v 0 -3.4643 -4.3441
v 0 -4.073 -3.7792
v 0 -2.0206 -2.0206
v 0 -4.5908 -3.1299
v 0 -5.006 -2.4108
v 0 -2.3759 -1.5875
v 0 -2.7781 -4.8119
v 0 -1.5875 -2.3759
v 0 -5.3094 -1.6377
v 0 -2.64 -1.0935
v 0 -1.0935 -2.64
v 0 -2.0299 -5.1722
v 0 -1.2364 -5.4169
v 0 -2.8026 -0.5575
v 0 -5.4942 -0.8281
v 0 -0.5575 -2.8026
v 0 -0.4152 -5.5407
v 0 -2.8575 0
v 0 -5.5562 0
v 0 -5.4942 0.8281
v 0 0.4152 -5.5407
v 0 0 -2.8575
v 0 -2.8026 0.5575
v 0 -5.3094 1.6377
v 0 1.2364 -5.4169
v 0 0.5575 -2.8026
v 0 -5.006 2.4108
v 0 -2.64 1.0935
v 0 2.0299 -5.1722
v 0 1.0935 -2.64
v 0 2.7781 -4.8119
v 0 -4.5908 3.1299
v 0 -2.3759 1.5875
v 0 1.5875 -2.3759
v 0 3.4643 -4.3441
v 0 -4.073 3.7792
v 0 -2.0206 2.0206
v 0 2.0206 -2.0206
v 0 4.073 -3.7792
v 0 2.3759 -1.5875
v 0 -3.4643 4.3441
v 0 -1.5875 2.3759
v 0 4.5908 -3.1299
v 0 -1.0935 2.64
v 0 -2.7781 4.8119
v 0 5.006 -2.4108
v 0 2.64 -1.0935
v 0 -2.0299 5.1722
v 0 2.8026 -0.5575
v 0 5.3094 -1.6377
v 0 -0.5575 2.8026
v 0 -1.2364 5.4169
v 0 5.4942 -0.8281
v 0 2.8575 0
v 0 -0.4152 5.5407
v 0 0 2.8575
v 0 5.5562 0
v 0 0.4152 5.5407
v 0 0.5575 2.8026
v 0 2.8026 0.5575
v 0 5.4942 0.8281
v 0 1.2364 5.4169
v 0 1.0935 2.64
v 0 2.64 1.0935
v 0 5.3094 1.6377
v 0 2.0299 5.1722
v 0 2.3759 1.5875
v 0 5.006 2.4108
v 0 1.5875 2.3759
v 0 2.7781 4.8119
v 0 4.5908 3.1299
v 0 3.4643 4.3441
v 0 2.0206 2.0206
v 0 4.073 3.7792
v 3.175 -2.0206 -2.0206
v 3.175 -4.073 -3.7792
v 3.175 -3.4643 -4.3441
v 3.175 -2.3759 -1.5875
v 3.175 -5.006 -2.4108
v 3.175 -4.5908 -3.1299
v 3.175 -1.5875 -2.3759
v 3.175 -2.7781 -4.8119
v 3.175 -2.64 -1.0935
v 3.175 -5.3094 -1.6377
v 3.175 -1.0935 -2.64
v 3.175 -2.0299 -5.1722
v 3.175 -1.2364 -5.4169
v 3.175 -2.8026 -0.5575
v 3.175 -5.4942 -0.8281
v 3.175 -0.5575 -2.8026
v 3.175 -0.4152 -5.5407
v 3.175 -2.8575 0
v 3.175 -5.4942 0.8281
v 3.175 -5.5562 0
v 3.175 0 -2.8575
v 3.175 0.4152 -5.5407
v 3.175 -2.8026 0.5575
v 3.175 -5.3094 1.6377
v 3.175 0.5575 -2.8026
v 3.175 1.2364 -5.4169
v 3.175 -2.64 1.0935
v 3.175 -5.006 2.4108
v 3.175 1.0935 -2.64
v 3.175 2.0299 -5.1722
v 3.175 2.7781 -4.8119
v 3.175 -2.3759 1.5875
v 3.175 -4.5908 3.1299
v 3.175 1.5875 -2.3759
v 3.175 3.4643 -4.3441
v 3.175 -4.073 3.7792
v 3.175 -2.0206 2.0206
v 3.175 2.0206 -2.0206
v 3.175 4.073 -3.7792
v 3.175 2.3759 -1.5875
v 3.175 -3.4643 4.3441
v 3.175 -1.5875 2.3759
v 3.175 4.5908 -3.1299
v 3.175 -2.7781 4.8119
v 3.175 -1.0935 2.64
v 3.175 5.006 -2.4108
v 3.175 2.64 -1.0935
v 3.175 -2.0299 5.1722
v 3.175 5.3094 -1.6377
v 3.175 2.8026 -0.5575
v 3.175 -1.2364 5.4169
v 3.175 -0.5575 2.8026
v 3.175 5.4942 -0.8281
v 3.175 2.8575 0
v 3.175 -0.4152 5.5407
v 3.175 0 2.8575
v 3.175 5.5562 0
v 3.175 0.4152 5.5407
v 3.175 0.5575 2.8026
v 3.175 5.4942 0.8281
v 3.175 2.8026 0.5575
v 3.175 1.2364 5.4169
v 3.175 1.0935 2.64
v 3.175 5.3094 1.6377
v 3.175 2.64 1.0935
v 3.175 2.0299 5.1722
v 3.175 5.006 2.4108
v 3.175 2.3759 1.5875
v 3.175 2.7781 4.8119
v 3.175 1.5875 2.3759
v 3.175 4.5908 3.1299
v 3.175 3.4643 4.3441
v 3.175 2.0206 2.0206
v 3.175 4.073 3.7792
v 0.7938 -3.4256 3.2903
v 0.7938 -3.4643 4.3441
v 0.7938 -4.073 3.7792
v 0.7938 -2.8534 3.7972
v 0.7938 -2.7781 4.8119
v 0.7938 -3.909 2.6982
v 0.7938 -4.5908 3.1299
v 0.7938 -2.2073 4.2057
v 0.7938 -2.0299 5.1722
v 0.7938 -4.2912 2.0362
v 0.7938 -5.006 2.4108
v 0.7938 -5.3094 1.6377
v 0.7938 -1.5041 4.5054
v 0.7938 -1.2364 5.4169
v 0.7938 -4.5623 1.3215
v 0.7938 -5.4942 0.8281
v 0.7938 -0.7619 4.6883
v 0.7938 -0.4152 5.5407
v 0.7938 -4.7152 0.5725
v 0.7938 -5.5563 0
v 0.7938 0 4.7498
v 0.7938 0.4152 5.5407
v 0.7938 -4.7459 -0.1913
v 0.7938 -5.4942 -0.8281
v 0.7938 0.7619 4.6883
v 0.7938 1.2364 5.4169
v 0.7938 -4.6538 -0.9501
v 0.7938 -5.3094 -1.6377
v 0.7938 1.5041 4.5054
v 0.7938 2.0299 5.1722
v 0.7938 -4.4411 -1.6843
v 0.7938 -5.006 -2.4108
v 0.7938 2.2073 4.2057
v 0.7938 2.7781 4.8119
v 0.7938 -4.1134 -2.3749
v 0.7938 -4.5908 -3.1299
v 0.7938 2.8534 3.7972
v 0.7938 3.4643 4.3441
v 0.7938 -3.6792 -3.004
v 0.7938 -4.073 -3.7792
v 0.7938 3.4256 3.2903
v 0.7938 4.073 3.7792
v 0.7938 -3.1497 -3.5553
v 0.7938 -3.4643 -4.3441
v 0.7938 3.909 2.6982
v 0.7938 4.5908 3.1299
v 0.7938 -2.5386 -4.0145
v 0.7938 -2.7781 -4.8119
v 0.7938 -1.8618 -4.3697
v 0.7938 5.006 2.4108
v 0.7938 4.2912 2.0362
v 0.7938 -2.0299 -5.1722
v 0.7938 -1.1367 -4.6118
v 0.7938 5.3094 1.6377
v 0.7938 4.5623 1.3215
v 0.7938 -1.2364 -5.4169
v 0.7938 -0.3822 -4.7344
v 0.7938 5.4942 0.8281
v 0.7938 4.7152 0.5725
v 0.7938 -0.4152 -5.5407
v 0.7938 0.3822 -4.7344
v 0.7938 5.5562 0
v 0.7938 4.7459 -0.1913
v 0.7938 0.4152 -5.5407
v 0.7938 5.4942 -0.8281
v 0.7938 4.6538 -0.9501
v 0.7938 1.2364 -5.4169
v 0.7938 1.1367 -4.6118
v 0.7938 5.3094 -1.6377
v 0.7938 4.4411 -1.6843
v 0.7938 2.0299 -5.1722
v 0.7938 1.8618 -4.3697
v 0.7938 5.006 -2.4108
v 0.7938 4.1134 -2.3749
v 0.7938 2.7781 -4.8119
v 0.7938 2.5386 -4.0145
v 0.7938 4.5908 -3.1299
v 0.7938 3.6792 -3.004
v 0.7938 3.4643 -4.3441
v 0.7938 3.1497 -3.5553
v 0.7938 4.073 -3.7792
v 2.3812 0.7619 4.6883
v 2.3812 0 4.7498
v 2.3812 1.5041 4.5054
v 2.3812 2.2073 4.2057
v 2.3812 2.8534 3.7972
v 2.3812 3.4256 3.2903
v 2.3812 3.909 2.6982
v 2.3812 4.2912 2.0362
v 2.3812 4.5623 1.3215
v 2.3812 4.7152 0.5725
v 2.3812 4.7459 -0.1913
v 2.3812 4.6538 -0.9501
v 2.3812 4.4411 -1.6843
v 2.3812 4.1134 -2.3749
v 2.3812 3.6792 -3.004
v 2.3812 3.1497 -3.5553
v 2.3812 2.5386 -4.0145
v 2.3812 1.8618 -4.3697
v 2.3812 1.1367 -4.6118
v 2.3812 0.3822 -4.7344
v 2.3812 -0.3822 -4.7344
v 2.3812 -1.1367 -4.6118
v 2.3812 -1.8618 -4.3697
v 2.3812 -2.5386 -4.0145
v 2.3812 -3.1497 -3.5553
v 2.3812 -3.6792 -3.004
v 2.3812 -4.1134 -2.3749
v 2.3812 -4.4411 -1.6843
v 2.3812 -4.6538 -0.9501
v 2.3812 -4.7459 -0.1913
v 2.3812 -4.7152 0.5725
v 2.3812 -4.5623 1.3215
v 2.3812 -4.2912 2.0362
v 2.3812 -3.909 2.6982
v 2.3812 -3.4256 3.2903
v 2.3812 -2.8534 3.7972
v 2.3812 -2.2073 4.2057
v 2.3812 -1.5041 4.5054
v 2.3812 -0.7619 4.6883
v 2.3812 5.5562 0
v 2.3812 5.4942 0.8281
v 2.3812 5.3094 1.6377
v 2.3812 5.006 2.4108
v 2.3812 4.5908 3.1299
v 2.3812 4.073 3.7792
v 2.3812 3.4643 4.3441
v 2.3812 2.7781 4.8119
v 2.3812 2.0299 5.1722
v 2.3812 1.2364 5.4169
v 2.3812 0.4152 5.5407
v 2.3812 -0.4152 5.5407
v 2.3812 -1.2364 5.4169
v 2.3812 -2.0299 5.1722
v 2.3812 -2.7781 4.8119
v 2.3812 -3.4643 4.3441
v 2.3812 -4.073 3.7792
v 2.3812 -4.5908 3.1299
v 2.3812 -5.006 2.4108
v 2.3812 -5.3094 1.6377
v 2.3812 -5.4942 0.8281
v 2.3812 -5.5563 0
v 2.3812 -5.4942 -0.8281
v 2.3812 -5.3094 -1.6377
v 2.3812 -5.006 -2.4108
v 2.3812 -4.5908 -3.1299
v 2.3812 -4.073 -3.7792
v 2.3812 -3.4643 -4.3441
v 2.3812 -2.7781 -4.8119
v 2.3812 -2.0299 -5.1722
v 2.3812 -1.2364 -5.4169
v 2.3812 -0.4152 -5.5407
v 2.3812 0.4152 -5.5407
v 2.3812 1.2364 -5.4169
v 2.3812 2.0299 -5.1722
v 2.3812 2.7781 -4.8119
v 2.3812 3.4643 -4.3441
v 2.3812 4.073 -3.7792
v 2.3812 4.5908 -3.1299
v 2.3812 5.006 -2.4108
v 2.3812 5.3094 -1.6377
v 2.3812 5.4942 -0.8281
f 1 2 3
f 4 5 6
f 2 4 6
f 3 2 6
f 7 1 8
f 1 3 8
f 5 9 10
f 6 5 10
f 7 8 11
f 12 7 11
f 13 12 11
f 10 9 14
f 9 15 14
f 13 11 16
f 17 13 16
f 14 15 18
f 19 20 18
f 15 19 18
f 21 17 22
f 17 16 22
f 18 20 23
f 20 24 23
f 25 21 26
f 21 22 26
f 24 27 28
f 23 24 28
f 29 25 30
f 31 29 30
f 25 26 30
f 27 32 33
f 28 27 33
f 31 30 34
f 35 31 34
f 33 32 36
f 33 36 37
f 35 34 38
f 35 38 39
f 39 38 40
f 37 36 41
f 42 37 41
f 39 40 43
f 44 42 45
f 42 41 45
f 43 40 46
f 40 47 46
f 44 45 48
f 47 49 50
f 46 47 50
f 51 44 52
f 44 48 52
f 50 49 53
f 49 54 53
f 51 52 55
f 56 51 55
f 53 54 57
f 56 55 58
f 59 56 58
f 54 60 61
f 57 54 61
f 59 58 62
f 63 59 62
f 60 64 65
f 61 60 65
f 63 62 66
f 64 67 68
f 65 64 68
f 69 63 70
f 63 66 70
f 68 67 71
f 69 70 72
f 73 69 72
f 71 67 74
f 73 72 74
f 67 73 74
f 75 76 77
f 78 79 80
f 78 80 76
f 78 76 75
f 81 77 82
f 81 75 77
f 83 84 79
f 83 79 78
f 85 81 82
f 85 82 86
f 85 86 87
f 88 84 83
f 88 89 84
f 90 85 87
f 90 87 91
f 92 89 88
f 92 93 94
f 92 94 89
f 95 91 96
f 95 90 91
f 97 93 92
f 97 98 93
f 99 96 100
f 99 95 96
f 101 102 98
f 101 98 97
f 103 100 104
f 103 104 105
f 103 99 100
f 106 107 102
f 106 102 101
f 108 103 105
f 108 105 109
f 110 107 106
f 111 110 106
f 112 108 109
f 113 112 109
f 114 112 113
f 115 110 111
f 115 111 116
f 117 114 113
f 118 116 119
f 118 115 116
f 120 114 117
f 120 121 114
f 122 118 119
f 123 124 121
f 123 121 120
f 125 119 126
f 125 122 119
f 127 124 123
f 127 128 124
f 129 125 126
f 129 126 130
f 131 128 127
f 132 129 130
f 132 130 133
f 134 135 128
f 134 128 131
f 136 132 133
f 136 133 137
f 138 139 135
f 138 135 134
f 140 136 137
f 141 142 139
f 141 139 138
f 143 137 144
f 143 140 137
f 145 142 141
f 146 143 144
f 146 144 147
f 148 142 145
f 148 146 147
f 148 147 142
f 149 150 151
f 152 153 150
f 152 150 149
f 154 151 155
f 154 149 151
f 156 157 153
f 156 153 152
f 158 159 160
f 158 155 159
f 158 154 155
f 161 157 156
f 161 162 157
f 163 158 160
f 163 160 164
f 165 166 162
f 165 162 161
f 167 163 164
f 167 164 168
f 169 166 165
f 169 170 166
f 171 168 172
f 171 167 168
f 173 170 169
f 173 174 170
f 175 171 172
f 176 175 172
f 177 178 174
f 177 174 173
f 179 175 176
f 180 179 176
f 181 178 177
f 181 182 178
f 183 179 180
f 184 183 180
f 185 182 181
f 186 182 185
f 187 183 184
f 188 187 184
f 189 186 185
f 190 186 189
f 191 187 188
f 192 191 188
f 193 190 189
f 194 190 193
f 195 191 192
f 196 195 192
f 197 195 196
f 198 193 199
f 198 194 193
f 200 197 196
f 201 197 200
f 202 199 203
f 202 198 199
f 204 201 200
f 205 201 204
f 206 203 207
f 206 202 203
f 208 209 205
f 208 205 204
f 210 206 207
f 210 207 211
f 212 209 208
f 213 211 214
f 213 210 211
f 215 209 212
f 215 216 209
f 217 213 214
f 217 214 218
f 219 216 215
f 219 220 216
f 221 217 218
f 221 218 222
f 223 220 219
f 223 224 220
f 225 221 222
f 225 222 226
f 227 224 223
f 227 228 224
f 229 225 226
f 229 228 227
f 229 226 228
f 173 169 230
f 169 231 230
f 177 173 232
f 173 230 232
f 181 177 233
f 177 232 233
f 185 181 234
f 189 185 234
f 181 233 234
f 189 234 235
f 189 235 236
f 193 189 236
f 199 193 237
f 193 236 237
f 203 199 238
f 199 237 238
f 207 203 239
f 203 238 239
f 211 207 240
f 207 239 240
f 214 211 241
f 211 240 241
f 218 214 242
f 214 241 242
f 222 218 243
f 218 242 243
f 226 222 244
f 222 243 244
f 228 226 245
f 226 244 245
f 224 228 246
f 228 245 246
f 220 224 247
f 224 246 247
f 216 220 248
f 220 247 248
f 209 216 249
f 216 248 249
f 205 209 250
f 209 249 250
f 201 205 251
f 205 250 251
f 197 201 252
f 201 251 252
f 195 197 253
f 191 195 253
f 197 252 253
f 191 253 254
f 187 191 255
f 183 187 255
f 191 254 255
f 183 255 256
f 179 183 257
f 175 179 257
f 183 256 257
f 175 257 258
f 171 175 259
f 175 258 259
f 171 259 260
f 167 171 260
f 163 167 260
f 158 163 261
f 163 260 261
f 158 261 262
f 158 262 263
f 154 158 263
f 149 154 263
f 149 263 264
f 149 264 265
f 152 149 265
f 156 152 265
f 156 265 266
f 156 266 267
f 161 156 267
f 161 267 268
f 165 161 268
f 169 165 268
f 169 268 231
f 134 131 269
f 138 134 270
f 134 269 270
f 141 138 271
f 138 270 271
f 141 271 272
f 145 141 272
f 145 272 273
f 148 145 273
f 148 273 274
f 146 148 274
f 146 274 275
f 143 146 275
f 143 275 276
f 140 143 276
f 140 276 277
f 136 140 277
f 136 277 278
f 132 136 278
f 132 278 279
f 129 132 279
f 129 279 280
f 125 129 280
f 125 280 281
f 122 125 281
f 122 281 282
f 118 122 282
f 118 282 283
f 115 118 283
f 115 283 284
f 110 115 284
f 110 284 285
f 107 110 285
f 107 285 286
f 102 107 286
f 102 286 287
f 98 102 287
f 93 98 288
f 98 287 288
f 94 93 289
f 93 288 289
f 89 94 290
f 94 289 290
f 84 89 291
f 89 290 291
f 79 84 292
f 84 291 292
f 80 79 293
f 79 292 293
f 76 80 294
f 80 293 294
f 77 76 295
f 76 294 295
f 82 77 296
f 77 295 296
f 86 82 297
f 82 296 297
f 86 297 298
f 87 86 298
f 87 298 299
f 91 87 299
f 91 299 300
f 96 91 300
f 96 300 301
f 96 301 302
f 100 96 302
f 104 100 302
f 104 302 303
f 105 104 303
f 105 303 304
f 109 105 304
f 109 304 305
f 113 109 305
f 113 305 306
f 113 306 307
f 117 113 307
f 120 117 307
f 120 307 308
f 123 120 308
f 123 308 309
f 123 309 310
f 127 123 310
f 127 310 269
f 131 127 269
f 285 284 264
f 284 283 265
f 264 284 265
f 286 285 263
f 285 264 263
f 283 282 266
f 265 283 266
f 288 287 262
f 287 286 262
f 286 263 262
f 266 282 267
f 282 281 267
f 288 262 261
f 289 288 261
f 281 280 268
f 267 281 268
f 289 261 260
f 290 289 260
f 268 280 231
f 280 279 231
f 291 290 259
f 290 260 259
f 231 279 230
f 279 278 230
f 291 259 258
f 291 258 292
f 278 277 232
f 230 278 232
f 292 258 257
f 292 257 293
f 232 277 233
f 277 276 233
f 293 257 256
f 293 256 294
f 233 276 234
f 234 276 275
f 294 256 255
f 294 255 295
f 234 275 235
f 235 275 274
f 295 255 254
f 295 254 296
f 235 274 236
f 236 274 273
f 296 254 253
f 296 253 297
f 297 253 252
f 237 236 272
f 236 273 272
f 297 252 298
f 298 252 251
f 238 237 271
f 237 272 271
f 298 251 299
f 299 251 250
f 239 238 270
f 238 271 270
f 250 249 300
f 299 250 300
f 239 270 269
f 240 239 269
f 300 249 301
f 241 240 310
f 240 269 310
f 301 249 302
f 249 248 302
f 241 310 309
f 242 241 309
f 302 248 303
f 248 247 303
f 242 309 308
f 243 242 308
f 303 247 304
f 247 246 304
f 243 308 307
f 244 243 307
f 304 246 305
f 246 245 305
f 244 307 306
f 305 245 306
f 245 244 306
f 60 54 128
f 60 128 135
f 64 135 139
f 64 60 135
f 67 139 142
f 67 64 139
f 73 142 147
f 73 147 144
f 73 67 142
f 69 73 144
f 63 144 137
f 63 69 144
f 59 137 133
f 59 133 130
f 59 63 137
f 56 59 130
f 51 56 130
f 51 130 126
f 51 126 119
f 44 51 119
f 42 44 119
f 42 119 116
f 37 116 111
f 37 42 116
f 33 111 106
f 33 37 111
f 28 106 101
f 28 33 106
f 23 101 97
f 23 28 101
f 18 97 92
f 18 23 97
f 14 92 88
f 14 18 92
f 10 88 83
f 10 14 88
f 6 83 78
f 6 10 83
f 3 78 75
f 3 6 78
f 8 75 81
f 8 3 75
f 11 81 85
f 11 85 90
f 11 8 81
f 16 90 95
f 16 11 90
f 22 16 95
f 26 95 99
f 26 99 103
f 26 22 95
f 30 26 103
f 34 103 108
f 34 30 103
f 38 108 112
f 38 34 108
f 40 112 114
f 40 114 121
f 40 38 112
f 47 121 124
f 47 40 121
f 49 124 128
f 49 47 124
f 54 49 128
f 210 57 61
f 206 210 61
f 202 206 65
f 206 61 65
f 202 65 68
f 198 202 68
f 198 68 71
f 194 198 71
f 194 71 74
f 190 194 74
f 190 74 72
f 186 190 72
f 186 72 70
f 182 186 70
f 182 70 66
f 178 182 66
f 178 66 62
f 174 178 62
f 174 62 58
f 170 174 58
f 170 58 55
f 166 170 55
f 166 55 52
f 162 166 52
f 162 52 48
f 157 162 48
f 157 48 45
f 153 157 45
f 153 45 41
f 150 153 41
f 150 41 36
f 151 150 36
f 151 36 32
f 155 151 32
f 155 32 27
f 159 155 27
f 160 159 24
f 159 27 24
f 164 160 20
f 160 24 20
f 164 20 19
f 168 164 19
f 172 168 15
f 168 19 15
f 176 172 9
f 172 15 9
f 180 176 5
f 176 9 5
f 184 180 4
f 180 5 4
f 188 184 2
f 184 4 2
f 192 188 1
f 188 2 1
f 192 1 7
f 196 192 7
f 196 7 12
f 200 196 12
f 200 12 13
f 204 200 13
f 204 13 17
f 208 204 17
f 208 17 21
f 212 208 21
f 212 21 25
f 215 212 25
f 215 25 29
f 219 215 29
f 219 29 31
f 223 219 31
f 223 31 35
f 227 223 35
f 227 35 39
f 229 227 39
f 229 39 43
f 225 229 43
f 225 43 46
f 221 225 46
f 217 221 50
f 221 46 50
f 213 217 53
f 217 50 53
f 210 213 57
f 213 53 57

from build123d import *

# Parameters (mm, degrees)
F0_R     = 5.55625
F0_R_2   = 2.8575
F1_DEPTH = 3.175
F2_W     = 1.5875
F2_H     = 0.80645


with BuildPart() as f1:
    # F0 (on Right) → F1 (new body)
    with BuildSketch(Plane.YZ):
        Circle(F0_R)
        Circle(F0_R_2, mode=Mode.SUBTRACT)
    extrude(amount=F1_DEPTH)

    # F2 (on Front) → F3 (revolve, cut)
    with BuildSketch(Plane.XZ):
        with Locations((1.5875, 5.153025)):
            Rectangle(F2_W, F2_H)
    revolve(axis=Axis((-3.449974, 0, 0), (-1, 0, 0)), mode=Mode.SUBTRACT)


solid = f1.part
